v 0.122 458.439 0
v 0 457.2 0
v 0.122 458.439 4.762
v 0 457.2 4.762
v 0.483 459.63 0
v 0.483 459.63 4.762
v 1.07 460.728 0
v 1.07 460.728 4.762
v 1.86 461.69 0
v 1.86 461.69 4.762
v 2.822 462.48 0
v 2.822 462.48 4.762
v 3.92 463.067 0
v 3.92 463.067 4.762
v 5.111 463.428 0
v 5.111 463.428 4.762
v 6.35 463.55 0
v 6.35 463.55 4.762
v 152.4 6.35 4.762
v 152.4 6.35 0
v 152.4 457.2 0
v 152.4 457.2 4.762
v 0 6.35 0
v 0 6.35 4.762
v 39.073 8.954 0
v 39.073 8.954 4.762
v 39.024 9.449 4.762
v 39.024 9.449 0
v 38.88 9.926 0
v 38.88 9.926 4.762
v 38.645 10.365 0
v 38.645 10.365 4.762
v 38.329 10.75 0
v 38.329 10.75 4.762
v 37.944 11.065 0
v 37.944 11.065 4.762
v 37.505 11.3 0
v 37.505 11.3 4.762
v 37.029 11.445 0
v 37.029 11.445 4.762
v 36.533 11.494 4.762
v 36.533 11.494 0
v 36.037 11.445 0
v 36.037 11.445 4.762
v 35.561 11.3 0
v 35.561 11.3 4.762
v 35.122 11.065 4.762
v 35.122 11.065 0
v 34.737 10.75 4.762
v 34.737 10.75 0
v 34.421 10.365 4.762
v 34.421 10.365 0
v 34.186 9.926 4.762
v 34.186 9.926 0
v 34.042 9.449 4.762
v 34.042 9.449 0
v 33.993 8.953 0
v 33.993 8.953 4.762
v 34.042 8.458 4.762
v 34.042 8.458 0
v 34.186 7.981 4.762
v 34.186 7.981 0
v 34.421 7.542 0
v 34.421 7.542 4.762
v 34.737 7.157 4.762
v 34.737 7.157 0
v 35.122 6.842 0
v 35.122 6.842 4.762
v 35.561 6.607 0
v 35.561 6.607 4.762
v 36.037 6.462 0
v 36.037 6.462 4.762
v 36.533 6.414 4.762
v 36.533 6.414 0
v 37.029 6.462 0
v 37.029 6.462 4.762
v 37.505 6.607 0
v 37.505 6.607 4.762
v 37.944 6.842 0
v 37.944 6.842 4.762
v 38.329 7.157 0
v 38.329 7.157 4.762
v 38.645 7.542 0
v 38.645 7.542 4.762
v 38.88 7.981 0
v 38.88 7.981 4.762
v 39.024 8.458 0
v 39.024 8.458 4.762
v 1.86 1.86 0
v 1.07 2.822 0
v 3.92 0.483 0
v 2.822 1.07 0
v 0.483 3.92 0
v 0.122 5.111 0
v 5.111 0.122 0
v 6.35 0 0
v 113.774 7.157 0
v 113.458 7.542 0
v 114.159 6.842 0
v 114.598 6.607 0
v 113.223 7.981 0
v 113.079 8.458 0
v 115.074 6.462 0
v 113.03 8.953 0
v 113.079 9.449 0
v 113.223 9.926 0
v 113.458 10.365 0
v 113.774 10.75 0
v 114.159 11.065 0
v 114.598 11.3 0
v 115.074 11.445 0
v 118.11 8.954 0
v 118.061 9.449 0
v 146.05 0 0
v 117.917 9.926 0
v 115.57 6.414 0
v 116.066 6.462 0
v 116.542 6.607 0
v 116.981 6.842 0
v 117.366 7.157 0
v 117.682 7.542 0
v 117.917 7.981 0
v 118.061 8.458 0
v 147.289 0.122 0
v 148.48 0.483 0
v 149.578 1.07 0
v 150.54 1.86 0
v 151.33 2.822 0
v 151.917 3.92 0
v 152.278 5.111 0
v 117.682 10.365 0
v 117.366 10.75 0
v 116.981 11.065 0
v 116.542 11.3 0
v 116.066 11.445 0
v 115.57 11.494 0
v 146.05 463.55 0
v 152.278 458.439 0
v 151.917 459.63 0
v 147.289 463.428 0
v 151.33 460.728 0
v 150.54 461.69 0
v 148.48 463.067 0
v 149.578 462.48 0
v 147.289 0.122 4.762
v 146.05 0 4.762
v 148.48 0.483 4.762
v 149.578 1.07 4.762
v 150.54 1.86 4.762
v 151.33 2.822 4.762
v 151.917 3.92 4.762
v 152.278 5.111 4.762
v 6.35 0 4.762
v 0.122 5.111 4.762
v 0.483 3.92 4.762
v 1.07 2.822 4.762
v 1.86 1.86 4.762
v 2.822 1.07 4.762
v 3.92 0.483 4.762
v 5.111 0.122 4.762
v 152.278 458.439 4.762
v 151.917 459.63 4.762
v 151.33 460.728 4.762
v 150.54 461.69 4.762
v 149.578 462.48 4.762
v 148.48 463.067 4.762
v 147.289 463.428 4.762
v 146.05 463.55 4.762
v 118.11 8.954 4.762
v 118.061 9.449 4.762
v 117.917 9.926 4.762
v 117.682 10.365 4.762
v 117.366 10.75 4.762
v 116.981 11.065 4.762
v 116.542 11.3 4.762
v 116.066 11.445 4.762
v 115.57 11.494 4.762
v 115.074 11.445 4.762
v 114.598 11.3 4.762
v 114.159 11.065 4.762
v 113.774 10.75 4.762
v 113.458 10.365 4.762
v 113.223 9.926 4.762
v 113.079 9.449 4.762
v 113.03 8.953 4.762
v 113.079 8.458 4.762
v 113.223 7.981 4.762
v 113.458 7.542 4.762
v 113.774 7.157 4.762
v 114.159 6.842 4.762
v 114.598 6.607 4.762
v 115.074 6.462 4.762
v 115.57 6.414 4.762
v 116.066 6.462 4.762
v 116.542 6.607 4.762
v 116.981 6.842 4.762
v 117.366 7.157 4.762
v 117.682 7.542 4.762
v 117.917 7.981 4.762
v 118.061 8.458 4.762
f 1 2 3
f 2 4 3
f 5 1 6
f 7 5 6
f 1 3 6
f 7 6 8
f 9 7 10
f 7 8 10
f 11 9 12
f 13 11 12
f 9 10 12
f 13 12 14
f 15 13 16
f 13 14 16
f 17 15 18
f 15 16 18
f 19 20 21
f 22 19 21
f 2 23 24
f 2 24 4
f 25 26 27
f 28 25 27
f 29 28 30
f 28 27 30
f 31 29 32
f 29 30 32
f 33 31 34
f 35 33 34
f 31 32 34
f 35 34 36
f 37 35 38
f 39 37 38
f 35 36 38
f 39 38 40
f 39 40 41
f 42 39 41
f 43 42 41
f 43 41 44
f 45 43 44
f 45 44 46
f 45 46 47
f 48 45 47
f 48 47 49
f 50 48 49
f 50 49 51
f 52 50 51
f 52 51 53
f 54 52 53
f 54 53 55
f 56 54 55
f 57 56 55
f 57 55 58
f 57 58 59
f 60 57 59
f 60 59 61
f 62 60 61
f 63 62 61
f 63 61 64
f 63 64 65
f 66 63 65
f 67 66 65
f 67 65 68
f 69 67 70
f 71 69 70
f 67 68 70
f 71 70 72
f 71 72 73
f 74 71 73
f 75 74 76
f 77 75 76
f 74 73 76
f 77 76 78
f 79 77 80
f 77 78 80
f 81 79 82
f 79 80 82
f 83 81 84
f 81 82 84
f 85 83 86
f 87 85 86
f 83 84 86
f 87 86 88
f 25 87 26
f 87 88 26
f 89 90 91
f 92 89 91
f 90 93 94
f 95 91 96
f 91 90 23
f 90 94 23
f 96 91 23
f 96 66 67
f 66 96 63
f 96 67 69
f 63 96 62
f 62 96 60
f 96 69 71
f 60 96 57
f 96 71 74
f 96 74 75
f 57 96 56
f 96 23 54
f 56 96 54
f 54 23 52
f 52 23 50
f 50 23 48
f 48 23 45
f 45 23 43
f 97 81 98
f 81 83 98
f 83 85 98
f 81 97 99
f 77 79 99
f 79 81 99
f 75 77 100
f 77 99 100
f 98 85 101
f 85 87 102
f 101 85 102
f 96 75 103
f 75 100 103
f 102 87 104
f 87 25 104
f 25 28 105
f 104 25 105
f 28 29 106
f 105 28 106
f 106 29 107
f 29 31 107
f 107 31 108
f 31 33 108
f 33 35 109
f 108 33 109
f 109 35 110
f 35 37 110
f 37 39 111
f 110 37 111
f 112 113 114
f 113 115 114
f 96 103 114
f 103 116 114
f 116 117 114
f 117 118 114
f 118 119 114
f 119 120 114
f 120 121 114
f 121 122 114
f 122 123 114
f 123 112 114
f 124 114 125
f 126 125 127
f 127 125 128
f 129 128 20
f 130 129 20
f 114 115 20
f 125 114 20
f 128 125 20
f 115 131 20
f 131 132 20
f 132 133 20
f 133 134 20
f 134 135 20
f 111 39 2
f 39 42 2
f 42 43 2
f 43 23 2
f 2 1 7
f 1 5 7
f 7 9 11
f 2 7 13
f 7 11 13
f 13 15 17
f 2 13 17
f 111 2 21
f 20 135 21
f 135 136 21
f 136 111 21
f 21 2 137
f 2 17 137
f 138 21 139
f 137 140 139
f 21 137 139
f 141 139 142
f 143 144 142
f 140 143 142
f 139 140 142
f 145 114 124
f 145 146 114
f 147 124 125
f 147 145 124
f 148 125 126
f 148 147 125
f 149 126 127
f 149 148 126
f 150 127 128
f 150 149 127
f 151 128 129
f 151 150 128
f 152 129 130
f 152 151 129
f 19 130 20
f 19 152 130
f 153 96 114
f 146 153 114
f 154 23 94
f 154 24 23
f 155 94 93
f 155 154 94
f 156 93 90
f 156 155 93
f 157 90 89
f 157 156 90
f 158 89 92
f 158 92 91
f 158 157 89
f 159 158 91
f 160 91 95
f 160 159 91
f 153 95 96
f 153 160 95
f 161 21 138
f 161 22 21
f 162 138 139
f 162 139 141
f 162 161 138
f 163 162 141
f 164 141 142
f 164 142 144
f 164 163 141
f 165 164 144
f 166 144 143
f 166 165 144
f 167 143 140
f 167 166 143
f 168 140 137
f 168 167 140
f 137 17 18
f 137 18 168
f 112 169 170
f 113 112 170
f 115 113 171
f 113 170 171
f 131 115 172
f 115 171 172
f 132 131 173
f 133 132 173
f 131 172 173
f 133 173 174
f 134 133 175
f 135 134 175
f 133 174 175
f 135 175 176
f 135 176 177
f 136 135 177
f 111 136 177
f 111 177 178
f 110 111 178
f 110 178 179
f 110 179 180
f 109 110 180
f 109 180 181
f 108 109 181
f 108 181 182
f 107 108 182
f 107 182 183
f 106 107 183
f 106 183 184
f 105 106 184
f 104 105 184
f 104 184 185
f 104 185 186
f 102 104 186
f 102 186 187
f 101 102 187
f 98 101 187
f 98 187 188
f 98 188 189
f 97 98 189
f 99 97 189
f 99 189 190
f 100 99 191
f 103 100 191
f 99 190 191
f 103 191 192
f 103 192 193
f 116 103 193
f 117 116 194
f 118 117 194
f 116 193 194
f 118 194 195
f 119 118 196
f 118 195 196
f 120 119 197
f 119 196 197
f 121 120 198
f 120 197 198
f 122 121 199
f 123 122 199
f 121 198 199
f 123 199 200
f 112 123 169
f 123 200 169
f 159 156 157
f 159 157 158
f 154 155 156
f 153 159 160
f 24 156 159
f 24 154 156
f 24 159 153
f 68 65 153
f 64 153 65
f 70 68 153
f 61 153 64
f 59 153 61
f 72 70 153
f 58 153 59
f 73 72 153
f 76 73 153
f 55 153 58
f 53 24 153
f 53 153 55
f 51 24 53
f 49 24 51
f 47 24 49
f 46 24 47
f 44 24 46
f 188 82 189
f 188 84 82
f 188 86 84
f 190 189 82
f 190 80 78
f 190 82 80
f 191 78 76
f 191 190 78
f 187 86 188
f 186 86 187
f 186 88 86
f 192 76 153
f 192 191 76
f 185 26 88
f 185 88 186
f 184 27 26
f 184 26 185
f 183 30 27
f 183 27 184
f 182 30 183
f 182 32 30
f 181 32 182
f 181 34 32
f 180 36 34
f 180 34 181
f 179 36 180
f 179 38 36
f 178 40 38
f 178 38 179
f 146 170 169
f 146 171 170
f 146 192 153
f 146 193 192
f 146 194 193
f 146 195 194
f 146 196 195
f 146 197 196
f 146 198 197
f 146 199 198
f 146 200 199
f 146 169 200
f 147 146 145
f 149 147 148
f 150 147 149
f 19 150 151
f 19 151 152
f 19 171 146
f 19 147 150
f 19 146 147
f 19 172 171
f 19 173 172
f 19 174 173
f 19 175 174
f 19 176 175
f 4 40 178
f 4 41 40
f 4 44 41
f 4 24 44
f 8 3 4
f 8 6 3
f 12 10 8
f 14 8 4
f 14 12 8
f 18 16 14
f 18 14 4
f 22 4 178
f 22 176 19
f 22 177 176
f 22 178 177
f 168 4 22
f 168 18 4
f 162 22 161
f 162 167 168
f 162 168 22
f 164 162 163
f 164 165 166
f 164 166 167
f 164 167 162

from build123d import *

# Parameters (mm, degrees)
SKETCH1_W           = 152.4
SKETCH1_H           = 463.55
BOSS_EXTRUDE1_DEPTH = 4.7625
FILLET1_R           = 6.35
SKETCH2_R           = 2.54
CUT_EXTRUDE1_DEPTH  = 7.62


with BuildPart() as part:
    # Sketch1 → Boss-Extrude1 (new body)
    with BuildSketch(Plane.XY):
        with Locations((76.2, 231.775)):
            Rectangle(SKETCH1_W, SKETCH1_H)
    extrude(amount=BOSS_EXTRUDE1_DEPTH)

    # Fillet1
    fillet1_edges = [part.edges().sort_by_distance(p)[0] for p in [
        (0, 463.55, 2.38125),
        (152.4, 463.55, 2.38125),
        (152.4, 0, 2.38125),
        (0, 0, 2.38125),
    ]]
    fillet(fillet1_edges, radius=FILLET1_R)

    # Sketch2 → Cut-Extrude1 (cut)
    with BuildSketch(Plane.XY.offset(4.7625)):
        with Locations((115.57, 8.9535)):
            Circle(SKETCH2_R)
        with Locations((36.532989097, 8.9535)):
            Circle(SKETCH2_R)
    extrude(amount=-CUT_EXTRUDE1_DEPTH, mode=Mode.SUBTRACT)


solid = part.part
